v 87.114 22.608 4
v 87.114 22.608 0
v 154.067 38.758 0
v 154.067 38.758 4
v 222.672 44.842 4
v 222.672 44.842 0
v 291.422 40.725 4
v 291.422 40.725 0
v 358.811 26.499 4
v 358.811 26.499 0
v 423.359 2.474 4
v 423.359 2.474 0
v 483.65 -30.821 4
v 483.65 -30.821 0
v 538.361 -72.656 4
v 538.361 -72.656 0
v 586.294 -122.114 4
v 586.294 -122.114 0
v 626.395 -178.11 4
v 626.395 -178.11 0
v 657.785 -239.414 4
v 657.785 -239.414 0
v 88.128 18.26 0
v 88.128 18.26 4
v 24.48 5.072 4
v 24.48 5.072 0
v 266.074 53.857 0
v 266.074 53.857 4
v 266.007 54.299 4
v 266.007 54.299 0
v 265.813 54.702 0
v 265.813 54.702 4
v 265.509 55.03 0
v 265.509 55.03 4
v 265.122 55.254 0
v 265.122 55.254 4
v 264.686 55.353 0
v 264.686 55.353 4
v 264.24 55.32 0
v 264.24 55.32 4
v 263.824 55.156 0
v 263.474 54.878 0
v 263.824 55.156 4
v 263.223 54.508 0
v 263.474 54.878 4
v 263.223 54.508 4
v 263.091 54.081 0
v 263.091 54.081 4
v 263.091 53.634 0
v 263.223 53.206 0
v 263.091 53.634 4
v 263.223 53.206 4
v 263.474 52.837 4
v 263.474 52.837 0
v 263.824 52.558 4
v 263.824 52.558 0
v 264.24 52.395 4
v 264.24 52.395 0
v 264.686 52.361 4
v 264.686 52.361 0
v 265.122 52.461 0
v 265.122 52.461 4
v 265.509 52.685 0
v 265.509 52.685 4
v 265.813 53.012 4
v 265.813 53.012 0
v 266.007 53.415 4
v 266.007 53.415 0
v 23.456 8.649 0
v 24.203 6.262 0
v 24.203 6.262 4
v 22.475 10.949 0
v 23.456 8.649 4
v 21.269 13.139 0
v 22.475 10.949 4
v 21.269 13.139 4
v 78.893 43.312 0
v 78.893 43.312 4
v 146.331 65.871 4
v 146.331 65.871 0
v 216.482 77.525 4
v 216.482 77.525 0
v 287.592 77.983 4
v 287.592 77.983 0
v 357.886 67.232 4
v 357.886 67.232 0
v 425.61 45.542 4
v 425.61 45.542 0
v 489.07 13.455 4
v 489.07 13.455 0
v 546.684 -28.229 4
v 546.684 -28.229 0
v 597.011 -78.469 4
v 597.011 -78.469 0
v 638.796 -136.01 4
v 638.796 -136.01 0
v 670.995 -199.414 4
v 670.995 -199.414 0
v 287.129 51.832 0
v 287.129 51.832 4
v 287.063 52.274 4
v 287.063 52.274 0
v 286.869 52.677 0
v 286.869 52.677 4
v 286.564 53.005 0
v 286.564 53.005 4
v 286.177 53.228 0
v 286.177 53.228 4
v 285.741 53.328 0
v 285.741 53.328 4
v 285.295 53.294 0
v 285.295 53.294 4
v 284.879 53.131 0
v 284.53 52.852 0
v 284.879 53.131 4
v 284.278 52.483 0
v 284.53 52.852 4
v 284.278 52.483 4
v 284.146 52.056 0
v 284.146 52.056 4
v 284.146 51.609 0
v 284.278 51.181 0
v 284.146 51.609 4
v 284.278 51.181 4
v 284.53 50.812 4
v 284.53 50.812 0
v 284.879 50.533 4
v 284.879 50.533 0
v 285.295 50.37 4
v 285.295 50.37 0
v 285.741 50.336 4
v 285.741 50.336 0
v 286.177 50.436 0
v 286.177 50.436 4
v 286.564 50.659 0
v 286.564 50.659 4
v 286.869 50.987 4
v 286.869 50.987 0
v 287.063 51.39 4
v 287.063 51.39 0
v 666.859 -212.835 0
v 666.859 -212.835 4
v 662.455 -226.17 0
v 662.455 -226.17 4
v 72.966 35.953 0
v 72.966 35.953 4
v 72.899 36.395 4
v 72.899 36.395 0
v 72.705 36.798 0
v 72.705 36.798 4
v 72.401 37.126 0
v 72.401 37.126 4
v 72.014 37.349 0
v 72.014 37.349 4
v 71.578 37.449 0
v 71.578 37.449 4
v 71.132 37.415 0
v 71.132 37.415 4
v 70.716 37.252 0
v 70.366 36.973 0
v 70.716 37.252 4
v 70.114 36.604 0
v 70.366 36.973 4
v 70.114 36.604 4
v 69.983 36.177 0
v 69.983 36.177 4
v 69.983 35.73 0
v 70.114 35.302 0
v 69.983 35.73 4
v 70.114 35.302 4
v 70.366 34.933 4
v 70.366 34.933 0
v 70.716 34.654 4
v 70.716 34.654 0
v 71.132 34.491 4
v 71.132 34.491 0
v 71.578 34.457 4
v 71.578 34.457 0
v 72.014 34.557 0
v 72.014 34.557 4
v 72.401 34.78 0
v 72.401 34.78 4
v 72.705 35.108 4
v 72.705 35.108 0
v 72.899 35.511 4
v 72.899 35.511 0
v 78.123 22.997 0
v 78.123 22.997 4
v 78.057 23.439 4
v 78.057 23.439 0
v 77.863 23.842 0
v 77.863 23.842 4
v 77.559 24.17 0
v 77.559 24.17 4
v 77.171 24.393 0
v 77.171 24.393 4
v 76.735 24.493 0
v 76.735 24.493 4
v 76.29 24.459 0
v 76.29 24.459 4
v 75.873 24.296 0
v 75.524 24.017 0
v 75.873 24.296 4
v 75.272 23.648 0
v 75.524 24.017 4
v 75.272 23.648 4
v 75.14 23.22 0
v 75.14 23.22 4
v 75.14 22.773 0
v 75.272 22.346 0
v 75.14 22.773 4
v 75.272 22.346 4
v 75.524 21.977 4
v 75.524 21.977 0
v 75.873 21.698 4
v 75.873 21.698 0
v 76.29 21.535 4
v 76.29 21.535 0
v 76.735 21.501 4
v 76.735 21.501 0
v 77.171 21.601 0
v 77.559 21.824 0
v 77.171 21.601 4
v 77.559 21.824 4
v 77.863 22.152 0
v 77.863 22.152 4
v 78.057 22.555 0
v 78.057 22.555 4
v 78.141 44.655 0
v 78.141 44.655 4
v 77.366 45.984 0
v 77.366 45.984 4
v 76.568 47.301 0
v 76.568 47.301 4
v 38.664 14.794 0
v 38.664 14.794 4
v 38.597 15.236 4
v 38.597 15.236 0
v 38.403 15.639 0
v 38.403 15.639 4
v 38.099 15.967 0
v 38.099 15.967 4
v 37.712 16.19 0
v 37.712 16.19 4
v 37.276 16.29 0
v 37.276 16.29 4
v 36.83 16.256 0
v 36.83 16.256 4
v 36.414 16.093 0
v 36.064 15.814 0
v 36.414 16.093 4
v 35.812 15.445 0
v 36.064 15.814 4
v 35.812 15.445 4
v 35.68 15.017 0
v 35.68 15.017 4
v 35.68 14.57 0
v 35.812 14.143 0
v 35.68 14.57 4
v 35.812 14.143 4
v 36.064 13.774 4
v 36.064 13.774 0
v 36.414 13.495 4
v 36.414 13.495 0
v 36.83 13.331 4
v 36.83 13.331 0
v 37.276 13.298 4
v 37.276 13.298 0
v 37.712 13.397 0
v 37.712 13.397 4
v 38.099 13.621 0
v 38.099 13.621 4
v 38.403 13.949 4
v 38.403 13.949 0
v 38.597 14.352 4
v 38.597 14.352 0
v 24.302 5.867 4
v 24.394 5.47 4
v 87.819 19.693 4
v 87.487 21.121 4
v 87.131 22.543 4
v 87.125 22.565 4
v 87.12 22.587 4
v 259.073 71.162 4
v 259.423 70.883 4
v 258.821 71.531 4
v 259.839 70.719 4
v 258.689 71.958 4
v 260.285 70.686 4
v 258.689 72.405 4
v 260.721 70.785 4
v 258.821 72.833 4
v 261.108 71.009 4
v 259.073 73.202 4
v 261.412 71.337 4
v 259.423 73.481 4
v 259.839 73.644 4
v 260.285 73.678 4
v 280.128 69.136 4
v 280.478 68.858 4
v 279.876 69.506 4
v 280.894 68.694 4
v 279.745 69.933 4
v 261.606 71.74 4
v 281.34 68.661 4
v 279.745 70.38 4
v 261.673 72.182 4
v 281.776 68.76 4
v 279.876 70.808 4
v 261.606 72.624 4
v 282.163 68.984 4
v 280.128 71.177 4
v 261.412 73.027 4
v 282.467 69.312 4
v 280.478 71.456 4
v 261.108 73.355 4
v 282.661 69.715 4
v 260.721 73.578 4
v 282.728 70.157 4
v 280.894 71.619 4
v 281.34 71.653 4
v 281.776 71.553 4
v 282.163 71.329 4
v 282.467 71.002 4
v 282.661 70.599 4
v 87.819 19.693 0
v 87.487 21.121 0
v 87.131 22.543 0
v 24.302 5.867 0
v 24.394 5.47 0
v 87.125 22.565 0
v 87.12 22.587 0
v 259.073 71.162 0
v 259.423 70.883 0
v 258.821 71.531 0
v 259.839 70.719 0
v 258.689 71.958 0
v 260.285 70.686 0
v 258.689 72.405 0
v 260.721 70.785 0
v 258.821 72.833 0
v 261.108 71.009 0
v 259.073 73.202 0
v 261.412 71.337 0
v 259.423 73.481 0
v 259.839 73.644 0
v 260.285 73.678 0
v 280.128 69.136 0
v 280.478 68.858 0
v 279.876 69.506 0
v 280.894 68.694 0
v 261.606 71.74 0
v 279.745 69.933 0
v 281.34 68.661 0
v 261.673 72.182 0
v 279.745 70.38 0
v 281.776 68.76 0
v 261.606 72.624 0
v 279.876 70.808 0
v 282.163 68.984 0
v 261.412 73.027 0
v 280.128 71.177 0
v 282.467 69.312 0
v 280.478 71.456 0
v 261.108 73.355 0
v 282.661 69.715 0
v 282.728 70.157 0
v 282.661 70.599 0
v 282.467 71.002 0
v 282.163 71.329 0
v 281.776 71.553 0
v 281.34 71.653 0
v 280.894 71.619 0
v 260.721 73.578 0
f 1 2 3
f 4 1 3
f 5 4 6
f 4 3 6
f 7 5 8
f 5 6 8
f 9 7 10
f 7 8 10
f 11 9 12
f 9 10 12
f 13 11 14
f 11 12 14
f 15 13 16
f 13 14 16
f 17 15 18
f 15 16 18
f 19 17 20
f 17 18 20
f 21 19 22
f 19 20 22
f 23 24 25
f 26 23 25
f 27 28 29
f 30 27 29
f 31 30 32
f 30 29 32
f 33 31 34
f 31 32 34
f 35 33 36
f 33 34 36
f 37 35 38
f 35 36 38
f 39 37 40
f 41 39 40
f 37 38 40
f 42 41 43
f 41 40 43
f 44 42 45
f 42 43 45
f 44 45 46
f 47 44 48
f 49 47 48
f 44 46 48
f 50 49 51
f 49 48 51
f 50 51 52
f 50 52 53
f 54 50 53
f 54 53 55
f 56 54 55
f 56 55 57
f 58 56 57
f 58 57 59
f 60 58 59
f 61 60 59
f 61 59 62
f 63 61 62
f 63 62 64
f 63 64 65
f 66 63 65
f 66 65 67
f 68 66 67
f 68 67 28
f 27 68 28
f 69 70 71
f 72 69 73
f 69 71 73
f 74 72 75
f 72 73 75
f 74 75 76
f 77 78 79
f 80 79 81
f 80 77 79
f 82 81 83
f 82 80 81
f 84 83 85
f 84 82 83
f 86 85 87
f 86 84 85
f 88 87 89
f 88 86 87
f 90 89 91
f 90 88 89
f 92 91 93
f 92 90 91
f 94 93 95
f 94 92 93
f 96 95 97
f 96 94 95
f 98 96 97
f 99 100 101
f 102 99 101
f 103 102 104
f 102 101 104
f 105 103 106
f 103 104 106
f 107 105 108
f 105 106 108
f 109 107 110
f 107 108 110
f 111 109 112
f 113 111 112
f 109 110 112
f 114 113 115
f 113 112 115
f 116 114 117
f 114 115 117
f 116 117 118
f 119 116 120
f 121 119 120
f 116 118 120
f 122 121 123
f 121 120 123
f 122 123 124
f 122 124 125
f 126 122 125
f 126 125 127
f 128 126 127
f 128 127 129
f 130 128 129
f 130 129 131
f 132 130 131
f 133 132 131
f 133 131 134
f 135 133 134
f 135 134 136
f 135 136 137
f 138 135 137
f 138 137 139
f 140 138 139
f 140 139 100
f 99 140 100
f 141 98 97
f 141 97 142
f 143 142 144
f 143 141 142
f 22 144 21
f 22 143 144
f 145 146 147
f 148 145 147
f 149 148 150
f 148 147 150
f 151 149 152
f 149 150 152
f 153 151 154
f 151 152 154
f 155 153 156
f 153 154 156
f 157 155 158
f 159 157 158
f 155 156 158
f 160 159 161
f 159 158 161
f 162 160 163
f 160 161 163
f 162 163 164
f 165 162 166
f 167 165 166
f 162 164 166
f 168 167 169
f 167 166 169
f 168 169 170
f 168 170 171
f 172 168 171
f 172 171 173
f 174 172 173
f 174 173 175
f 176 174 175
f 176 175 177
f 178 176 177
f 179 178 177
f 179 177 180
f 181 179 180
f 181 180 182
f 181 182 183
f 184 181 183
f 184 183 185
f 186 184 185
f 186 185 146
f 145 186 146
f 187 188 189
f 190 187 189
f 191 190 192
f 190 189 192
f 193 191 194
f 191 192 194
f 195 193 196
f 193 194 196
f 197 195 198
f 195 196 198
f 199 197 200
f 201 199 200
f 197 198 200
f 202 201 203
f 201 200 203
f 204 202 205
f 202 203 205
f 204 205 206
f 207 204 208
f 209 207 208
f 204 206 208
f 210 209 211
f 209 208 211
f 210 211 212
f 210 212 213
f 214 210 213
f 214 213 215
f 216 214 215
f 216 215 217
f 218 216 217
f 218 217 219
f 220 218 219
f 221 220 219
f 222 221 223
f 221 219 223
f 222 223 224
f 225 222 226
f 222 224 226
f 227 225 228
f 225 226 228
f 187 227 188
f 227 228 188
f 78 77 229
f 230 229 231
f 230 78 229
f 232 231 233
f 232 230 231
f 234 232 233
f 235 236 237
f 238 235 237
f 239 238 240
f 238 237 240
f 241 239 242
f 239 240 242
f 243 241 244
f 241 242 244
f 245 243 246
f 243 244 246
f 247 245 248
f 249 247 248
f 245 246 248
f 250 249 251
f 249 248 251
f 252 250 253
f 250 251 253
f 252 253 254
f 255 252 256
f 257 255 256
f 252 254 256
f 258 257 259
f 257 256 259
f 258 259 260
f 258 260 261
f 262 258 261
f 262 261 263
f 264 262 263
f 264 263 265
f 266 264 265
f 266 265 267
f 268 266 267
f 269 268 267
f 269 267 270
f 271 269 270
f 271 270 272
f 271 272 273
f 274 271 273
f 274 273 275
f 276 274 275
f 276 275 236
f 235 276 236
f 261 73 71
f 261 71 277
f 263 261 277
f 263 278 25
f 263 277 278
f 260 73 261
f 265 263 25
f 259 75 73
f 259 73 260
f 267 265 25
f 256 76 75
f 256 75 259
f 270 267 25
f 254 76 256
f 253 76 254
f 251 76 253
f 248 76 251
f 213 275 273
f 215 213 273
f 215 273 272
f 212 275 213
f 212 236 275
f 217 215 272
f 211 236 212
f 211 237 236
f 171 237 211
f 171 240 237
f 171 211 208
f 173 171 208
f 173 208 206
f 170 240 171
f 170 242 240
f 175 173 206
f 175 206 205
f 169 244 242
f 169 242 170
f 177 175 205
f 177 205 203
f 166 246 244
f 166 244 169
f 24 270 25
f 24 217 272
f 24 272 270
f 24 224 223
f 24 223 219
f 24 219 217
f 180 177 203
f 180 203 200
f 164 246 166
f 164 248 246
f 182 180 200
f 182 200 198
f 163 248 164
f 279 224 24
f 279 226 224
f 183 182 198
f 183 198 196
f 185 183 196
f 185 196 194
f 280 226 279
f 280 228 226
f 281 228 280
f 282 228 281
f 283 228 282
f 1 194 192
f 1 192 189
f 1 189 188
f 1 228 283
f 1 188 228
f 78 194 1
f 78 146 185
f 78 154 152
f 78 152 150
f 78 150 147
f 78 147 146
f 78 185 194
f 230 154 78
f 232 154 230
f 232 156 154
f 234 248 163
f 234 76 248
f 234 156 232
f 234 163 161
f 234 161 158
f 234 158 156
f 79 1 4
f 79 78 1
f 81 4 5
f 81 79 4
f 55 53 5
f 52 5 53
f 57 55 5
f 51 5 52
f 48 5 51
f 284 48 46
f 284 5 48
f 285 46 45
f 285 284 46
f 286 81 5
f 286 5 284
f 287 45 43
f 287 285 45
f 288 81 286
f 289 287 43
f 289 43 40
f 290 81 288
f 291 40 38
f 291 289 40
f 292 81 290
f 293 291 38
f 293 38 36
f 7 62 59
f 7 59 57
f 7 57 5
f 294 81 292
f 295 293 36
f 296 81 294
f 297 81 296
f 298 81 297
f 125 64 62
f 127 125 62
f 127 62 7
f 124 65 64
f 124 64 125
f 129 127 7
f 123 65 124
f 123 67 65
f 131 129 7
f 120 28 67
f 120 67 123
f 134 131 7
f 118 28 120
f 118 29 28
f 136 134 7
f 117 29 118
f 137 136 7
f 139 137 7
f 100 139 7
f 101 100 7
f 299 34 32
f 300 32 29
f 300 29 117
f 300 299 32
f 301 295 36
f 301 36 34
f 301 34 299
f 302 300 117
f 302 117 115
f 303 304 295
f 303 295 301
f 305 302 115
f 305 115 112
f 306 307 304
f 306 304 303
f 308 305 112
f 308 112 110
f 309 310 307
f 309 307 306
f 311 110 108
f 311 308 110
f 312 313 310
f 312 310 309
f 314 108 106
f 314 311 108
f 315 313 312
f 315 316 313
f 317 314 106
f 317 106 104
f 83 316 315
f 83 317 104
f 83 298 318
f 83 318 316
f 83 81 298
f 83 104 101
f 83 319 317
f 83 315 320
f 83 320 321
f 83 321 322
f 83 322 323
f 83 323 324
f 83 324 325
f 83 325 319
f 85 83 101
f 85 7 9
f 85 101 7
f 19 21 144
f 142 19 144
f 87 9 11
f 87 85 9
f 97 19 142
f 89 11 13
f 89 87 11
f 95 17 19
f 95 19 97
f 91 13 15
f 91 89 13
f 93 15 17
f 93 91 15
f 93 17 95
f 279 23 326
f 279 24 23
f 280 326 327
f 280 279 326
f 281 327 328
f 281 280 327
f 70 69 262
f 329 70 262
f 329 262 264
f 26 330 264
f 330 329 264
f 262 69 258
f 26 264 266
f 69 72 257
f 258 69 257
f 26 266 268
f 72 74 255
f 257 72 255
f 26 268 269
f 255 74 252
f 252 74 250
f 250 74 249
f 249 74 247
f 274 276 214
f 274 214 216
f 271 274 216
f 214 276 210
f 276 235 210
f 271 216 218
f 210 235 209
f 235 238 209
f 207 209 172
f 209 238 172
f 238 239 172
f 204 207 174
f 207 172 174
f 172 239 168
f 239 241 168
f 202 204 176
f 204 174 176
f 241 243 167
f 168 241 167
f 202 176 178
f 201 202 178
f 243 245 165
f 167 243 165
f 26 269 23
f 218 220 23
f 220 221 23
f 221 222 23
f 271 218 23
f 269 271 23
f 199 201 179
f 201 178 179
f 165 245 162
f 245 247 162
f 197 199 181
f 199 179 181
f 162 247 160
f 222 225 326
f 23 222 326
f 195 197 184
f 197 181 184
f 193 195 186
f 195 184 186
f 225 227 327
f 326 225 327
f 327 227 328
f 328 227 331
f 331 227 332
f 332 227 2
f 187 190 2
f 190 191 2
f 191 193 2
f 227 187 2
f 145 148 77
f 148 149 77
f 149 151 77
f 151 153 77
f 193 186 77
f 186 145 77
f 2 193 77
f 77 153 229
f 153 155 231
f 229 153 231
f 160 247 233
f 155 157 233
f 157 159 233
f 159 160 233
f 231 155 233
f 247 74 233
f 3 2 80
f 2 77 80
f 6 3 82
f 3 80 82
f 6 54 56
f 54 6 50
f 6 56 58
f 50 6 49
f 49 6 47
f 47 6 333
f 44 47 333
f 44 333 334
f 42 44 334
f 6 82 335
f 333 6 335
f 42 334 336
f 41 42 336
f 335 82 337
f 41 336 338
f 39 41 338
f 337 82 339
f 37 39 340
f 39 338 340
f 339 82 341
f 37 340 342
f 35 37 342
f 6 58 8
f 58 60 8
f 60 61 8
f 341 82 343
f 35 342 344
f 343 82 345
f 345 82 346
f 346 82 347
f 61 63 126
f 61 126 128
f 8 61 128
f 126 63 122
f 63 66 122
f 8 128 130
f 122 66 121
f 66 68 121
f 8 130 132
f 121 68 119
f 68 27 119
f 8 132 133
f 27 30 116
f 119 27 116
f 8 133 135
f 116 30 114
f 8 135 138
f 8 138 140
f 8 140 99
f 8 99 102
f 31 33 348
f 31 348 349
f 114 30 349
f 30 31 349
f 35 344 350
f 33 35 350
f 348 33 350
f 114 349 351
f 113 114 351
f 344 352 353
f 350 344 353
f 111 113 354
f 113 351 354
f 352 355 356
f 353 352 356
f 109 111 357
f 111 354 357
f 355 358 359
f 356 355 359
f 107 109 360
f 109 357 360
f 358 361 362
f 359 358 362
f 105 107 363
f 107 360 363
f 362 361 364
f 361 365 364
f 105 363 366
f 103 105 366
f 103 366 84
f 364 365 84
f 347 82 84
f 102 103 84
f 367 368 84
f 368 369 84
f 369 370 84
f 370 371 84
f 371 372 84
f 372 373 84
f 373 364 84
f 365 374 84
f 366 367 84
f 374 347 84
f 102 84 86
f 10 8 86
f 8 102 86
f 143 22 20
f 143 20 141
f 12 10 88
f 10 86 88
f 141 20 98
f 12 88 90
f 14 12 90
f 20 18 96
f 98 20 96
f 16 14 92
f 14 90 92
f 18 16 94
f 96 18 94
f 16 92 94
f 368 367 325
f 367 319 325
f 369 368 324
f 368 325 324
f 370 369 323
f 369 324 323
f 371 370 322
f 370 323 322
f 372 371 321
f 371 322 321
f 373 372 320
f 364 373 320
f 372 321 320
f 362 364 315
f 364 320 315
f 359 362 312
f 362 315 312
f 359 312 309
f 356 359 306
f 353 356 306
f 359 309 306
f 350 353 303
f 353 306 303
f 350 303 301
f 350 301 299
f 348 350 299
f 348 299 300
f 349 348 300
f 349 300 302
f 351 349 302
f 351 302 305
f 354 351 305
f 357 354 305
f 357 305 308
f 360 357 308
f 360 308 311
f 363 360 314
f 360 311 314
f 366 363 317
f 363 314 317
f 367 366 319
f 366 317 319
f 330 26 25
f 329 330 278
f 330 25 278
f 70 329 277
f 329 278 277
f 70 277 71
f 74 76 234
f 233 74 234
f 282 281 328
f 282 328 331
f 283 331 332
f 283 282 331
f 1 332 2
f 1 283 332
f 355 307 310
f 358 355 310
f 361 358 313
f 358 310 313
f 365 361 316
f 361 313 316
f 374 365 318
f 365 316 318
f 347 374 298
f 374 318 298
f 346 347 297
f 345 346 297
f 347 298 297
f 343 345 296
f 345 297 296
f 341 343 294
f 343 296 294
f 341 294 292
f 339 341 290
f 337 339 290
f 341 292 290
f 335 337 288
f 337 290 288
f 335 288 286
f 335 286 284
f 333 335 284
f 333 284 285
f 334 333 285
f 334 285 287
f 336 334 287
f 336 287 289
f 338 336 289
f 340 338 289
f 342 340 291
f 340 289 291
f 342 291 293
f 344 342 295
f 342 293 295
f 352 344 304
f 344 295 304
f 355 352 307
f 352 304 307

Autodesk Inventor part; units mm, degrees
ref_plane "YZ Plane" through (0, 0, 0) normal (1, 0, 0) x (0, 1, 0)
ref_plane "XZ Plane" through (0, 0, 0) normal (0, 1, 0) x (-1, 0, 0)
ref_plane "XY Plane" through (0, 0, 0) normal (0, 0, 1) x (1, 0, 0)
sketch "Sketch1" plane through (0, 0, 0) normal (0, 0, 1) x (1, 0, 0)
  arc A0 (670.9948, -199.4141) -> (0, 0) centre (254.9219, -370.8299) ccw
  arc A1 (657.7848, -239.4141) -> (30, 0) centre (229.3296, -420.1103) ccw
  arc A2 (657.7848, -239.4141) -> (670.9948, -199.4141) centre (0, 0) ccw
  line L0 (0, 0) -> (30, 0)
  line L1 (657.7848, -239.4141) -> (0, 0)
  line L2 (-143.7228, 0) -> (862.3369, 0) projected
  point P0 (0, 0)
  dimension "d1" = 30
  dimension "d2" = 40
  dimension "d4" = 20
  dimension "d5" = 465
  dimension "d6" = 450
  dimension "d22" = 700
extrude "Extrusion1" add sketch "Sketch1" along normal blind 4 contours A2 A1 L2 A0 | L2 A1 L0 A0
sketch "Sketch2" plane through (0, 0, 4) normal (0, 0, 1) x (1, 0, 0)
  arc A0 (670.9948, -199.4141) -> (0, 0) centre (254.9219, -370.8299) ccw projected
  arc A1 (87.1309, 22.5434) -> (74.166, 50.9844) centre (0, 0) ccw
  line L0 (74.166, 50.9844) -> (0, 0)
  line L1 (0, 0) -> (87.1309, 22.5434)
  line L2 (0, 0) -> (30, 0) projected
  point P0 (78.8927, 43.3122)
  point P1 (0, 0)
  point P2 (0, 0)
  dimension "d9" = 90
  dimension "d16" = 20
extrude "Extrusion2" add sketch "Sketch2" against normal blind 4
sketch "Sketch4" plane through (0, 0, 4) normal (0, 0, 1) x (1, 0, 0)
  line L0 (86.0304, 22.2587) -> (87.1309, 22.5434) projected
  line L1 (74.166, 50.9844) -> (0, 0) projected
  line L2 (87.1309, 22.5434) -> (0, 0)
  line L3 (0, 0) -> (30, 0)
  arc A0 (86.0304, 22.2587) -> (30, 0) centre (229.3296, -420.1103) ccw projected
  line L4 (30, 0) -> (86.0304, 22.2587)
  point P0 (86.0304, 22.2587)
extrude "Extrusion4" cut sketch "Sketch4" against normal blind 10 contours A0 L3 L2
sketch "Sketch5" plane through (0, 0, 4) normal (0, 0, 1) x (1, 0, 0)
  line L0 (0, 0) -> (20.6017, 14.1623)
  line L1 (74.166, 50.9844) -> (0, 0) projected
  line L2 (0, 0) -> (87.1309, 22.5434) projected
  line L3 (24.203, 6.2621) -> (0, 0)
  arc A0 (24.203, 6.2621) -> (20.6017, 14.1623) centre (0, 0) ccw
  point P0 (24.203, 6.2621)
  dimension "d21" = 25
extrude "Extrusion5" cut sketch "Sketch5" against normal blind 10
sketch "Sketch6" plane through (0, 0, 4) normal (0, 0, 1) x (1, 0, 0)
  circle A0 centre (37.1637, 14.7938) radius 1.5
  circle A1 centre (71.4659, 35.9531) radius 1.5
  circle A2 centre (76.6234, 22.9969) radius 1.5
  line L0 (37.1637, 14.7938) -> (0, 0)
  line L1 (0, 0) -> (71.4659, 35.9531)
  line L2 (76.6234, 22.9969) -> (0, 0)
  line L3 (24.203, 6.2621) -> (87.1309, 22.5434) projected
  line L4 (74.166, 50.9844) -> (20.6017, 14.1623) projected
  line L5 (0, 0) -> (261.3927, 67.6302)
  line L6 (0, 0) -> (264.574, 53.8573)
  circle A3 centre (260.1726, 72.1818) radius 1.5
  circle A4 centre (264.574, 53.8573) radius 1.5
  circle A5 centre (281.2279, 70.1567) radius 1.5
  circle A6 centre (285.6292, 51.8321) radius 1.5
  line L7 (281.2279, 70.1567) -> (285.6292, 51.8321)
  line L8 (285.6292, 51.8321) -> (264.574, 53.8573)
  line L9 (264.574, 53.8573) -> (260.1726, 72.1818)
  line L10 (260.1726, 72.1818) -> (281.2279, 70.1567)
  line L11 (260.1726, 72.1818) -> (0, 0)
  dimension "d23" = 3
  dimension "d24" = 3
  dimension "d25" = 3
  dimension "d26" = 7.2
  dimension "d27" = 2.2
  dimension "d28" = 7.8
  dimension "d29" = 40
  dimension "d30" = 80
  dimension "d31" = 80
  dimension "d34" = 3
  dimension "d35" = 270
  dimension "d36" = 270
  dimension "d37" = 3
  dimension "d38" = 3
  dimension "d39" = 20
  dimension "d40" = 109
  dimension "d41" = 3
  dimension "d42" = 3
  dimension "d43" = 1
  dimension "d44" = 270
extrude "Extrusion6" cut sketch "Sketch6" against normal blind 10 contours A0 | A2 | A1 | A4 L9 L6 | L6 L8 A4 | L11 L9 A3 | A3 L10 L11 | L9 A4 L8 | L9 L10 A3 | L8 L7 A6 | A6 L7 L8 | L10 L7 A5 | A5 L7 L10
sketch "Sketch7" plane through (0, 0, 4) normal (0, 0, 1) x (1, 0, 0)
  line L0 (20.6017, 14.1623) -> (74.166, 50.9844) projected
  arc A0 (78.8927, 43.3122) -> (74.166, 50.9844) centre (0, 0) ccw projected
  line L1 (20.6017, 14.1623) -> (74.166, 50.9844)
  line L2 (74.166, 50.9844) -> (82.5313, 50.9844)
  arc A1 (21.2689, 13.139) -> (20.6017, 14.1623) centre (0, 0) ccw
  line L3 (21.2689, 13.139) -> (82.5313, 50.9844)
  line L4 (21.2689, 13.139) -> (0, 0)
  line L5 (0, 0) -> (20.6017, 14.1623)
  point P0 (76.568, 47.3005)
  dimension "d45" = 2.8
extrude "Extrusion7" cut sketch "Sketch7" against normal blind 10 contours L0 A0 L3 A1
sketch "Sketch8" plane through (0, 0, 4) normal (0, 0, 1) x (1, 0, 0)
  line L0 (87.1309, 22.5434) -> (24.203, 6.2621) projected
  line L1 (24.203, 6.2621) -> (87.1309, 22.5434)
  arc A0 (24.48, 5.0723) -> (24.203, 6.2621) centre (0, 0) ccw
  arc A1 (88.1281, 18.2602) -> (87.1309, 22.5434) centre (0, 0) ccw
  line L2 (88.1281, 18.2602) -> (24.48, 5.0723)
  line L3 (24.48, 5.0723) -> (0, 0)
  arc A2 (24.203, 6.2621) -> (21.2689, 13.139) centre (0, 0) ccw projected
  line L4 (0, 0) -> (24.203, 6.2621)
  arc A3 (78.8927, 43.3122) -> (76.568, 47.3005) centre (0, 0) ccw projected
  dimension "d48" = 2.8
extrude "Extrusion8" add sketch "Sketch8" against normal blind 4 contours A1 L2 A0 L0
properties part number "spoke"
